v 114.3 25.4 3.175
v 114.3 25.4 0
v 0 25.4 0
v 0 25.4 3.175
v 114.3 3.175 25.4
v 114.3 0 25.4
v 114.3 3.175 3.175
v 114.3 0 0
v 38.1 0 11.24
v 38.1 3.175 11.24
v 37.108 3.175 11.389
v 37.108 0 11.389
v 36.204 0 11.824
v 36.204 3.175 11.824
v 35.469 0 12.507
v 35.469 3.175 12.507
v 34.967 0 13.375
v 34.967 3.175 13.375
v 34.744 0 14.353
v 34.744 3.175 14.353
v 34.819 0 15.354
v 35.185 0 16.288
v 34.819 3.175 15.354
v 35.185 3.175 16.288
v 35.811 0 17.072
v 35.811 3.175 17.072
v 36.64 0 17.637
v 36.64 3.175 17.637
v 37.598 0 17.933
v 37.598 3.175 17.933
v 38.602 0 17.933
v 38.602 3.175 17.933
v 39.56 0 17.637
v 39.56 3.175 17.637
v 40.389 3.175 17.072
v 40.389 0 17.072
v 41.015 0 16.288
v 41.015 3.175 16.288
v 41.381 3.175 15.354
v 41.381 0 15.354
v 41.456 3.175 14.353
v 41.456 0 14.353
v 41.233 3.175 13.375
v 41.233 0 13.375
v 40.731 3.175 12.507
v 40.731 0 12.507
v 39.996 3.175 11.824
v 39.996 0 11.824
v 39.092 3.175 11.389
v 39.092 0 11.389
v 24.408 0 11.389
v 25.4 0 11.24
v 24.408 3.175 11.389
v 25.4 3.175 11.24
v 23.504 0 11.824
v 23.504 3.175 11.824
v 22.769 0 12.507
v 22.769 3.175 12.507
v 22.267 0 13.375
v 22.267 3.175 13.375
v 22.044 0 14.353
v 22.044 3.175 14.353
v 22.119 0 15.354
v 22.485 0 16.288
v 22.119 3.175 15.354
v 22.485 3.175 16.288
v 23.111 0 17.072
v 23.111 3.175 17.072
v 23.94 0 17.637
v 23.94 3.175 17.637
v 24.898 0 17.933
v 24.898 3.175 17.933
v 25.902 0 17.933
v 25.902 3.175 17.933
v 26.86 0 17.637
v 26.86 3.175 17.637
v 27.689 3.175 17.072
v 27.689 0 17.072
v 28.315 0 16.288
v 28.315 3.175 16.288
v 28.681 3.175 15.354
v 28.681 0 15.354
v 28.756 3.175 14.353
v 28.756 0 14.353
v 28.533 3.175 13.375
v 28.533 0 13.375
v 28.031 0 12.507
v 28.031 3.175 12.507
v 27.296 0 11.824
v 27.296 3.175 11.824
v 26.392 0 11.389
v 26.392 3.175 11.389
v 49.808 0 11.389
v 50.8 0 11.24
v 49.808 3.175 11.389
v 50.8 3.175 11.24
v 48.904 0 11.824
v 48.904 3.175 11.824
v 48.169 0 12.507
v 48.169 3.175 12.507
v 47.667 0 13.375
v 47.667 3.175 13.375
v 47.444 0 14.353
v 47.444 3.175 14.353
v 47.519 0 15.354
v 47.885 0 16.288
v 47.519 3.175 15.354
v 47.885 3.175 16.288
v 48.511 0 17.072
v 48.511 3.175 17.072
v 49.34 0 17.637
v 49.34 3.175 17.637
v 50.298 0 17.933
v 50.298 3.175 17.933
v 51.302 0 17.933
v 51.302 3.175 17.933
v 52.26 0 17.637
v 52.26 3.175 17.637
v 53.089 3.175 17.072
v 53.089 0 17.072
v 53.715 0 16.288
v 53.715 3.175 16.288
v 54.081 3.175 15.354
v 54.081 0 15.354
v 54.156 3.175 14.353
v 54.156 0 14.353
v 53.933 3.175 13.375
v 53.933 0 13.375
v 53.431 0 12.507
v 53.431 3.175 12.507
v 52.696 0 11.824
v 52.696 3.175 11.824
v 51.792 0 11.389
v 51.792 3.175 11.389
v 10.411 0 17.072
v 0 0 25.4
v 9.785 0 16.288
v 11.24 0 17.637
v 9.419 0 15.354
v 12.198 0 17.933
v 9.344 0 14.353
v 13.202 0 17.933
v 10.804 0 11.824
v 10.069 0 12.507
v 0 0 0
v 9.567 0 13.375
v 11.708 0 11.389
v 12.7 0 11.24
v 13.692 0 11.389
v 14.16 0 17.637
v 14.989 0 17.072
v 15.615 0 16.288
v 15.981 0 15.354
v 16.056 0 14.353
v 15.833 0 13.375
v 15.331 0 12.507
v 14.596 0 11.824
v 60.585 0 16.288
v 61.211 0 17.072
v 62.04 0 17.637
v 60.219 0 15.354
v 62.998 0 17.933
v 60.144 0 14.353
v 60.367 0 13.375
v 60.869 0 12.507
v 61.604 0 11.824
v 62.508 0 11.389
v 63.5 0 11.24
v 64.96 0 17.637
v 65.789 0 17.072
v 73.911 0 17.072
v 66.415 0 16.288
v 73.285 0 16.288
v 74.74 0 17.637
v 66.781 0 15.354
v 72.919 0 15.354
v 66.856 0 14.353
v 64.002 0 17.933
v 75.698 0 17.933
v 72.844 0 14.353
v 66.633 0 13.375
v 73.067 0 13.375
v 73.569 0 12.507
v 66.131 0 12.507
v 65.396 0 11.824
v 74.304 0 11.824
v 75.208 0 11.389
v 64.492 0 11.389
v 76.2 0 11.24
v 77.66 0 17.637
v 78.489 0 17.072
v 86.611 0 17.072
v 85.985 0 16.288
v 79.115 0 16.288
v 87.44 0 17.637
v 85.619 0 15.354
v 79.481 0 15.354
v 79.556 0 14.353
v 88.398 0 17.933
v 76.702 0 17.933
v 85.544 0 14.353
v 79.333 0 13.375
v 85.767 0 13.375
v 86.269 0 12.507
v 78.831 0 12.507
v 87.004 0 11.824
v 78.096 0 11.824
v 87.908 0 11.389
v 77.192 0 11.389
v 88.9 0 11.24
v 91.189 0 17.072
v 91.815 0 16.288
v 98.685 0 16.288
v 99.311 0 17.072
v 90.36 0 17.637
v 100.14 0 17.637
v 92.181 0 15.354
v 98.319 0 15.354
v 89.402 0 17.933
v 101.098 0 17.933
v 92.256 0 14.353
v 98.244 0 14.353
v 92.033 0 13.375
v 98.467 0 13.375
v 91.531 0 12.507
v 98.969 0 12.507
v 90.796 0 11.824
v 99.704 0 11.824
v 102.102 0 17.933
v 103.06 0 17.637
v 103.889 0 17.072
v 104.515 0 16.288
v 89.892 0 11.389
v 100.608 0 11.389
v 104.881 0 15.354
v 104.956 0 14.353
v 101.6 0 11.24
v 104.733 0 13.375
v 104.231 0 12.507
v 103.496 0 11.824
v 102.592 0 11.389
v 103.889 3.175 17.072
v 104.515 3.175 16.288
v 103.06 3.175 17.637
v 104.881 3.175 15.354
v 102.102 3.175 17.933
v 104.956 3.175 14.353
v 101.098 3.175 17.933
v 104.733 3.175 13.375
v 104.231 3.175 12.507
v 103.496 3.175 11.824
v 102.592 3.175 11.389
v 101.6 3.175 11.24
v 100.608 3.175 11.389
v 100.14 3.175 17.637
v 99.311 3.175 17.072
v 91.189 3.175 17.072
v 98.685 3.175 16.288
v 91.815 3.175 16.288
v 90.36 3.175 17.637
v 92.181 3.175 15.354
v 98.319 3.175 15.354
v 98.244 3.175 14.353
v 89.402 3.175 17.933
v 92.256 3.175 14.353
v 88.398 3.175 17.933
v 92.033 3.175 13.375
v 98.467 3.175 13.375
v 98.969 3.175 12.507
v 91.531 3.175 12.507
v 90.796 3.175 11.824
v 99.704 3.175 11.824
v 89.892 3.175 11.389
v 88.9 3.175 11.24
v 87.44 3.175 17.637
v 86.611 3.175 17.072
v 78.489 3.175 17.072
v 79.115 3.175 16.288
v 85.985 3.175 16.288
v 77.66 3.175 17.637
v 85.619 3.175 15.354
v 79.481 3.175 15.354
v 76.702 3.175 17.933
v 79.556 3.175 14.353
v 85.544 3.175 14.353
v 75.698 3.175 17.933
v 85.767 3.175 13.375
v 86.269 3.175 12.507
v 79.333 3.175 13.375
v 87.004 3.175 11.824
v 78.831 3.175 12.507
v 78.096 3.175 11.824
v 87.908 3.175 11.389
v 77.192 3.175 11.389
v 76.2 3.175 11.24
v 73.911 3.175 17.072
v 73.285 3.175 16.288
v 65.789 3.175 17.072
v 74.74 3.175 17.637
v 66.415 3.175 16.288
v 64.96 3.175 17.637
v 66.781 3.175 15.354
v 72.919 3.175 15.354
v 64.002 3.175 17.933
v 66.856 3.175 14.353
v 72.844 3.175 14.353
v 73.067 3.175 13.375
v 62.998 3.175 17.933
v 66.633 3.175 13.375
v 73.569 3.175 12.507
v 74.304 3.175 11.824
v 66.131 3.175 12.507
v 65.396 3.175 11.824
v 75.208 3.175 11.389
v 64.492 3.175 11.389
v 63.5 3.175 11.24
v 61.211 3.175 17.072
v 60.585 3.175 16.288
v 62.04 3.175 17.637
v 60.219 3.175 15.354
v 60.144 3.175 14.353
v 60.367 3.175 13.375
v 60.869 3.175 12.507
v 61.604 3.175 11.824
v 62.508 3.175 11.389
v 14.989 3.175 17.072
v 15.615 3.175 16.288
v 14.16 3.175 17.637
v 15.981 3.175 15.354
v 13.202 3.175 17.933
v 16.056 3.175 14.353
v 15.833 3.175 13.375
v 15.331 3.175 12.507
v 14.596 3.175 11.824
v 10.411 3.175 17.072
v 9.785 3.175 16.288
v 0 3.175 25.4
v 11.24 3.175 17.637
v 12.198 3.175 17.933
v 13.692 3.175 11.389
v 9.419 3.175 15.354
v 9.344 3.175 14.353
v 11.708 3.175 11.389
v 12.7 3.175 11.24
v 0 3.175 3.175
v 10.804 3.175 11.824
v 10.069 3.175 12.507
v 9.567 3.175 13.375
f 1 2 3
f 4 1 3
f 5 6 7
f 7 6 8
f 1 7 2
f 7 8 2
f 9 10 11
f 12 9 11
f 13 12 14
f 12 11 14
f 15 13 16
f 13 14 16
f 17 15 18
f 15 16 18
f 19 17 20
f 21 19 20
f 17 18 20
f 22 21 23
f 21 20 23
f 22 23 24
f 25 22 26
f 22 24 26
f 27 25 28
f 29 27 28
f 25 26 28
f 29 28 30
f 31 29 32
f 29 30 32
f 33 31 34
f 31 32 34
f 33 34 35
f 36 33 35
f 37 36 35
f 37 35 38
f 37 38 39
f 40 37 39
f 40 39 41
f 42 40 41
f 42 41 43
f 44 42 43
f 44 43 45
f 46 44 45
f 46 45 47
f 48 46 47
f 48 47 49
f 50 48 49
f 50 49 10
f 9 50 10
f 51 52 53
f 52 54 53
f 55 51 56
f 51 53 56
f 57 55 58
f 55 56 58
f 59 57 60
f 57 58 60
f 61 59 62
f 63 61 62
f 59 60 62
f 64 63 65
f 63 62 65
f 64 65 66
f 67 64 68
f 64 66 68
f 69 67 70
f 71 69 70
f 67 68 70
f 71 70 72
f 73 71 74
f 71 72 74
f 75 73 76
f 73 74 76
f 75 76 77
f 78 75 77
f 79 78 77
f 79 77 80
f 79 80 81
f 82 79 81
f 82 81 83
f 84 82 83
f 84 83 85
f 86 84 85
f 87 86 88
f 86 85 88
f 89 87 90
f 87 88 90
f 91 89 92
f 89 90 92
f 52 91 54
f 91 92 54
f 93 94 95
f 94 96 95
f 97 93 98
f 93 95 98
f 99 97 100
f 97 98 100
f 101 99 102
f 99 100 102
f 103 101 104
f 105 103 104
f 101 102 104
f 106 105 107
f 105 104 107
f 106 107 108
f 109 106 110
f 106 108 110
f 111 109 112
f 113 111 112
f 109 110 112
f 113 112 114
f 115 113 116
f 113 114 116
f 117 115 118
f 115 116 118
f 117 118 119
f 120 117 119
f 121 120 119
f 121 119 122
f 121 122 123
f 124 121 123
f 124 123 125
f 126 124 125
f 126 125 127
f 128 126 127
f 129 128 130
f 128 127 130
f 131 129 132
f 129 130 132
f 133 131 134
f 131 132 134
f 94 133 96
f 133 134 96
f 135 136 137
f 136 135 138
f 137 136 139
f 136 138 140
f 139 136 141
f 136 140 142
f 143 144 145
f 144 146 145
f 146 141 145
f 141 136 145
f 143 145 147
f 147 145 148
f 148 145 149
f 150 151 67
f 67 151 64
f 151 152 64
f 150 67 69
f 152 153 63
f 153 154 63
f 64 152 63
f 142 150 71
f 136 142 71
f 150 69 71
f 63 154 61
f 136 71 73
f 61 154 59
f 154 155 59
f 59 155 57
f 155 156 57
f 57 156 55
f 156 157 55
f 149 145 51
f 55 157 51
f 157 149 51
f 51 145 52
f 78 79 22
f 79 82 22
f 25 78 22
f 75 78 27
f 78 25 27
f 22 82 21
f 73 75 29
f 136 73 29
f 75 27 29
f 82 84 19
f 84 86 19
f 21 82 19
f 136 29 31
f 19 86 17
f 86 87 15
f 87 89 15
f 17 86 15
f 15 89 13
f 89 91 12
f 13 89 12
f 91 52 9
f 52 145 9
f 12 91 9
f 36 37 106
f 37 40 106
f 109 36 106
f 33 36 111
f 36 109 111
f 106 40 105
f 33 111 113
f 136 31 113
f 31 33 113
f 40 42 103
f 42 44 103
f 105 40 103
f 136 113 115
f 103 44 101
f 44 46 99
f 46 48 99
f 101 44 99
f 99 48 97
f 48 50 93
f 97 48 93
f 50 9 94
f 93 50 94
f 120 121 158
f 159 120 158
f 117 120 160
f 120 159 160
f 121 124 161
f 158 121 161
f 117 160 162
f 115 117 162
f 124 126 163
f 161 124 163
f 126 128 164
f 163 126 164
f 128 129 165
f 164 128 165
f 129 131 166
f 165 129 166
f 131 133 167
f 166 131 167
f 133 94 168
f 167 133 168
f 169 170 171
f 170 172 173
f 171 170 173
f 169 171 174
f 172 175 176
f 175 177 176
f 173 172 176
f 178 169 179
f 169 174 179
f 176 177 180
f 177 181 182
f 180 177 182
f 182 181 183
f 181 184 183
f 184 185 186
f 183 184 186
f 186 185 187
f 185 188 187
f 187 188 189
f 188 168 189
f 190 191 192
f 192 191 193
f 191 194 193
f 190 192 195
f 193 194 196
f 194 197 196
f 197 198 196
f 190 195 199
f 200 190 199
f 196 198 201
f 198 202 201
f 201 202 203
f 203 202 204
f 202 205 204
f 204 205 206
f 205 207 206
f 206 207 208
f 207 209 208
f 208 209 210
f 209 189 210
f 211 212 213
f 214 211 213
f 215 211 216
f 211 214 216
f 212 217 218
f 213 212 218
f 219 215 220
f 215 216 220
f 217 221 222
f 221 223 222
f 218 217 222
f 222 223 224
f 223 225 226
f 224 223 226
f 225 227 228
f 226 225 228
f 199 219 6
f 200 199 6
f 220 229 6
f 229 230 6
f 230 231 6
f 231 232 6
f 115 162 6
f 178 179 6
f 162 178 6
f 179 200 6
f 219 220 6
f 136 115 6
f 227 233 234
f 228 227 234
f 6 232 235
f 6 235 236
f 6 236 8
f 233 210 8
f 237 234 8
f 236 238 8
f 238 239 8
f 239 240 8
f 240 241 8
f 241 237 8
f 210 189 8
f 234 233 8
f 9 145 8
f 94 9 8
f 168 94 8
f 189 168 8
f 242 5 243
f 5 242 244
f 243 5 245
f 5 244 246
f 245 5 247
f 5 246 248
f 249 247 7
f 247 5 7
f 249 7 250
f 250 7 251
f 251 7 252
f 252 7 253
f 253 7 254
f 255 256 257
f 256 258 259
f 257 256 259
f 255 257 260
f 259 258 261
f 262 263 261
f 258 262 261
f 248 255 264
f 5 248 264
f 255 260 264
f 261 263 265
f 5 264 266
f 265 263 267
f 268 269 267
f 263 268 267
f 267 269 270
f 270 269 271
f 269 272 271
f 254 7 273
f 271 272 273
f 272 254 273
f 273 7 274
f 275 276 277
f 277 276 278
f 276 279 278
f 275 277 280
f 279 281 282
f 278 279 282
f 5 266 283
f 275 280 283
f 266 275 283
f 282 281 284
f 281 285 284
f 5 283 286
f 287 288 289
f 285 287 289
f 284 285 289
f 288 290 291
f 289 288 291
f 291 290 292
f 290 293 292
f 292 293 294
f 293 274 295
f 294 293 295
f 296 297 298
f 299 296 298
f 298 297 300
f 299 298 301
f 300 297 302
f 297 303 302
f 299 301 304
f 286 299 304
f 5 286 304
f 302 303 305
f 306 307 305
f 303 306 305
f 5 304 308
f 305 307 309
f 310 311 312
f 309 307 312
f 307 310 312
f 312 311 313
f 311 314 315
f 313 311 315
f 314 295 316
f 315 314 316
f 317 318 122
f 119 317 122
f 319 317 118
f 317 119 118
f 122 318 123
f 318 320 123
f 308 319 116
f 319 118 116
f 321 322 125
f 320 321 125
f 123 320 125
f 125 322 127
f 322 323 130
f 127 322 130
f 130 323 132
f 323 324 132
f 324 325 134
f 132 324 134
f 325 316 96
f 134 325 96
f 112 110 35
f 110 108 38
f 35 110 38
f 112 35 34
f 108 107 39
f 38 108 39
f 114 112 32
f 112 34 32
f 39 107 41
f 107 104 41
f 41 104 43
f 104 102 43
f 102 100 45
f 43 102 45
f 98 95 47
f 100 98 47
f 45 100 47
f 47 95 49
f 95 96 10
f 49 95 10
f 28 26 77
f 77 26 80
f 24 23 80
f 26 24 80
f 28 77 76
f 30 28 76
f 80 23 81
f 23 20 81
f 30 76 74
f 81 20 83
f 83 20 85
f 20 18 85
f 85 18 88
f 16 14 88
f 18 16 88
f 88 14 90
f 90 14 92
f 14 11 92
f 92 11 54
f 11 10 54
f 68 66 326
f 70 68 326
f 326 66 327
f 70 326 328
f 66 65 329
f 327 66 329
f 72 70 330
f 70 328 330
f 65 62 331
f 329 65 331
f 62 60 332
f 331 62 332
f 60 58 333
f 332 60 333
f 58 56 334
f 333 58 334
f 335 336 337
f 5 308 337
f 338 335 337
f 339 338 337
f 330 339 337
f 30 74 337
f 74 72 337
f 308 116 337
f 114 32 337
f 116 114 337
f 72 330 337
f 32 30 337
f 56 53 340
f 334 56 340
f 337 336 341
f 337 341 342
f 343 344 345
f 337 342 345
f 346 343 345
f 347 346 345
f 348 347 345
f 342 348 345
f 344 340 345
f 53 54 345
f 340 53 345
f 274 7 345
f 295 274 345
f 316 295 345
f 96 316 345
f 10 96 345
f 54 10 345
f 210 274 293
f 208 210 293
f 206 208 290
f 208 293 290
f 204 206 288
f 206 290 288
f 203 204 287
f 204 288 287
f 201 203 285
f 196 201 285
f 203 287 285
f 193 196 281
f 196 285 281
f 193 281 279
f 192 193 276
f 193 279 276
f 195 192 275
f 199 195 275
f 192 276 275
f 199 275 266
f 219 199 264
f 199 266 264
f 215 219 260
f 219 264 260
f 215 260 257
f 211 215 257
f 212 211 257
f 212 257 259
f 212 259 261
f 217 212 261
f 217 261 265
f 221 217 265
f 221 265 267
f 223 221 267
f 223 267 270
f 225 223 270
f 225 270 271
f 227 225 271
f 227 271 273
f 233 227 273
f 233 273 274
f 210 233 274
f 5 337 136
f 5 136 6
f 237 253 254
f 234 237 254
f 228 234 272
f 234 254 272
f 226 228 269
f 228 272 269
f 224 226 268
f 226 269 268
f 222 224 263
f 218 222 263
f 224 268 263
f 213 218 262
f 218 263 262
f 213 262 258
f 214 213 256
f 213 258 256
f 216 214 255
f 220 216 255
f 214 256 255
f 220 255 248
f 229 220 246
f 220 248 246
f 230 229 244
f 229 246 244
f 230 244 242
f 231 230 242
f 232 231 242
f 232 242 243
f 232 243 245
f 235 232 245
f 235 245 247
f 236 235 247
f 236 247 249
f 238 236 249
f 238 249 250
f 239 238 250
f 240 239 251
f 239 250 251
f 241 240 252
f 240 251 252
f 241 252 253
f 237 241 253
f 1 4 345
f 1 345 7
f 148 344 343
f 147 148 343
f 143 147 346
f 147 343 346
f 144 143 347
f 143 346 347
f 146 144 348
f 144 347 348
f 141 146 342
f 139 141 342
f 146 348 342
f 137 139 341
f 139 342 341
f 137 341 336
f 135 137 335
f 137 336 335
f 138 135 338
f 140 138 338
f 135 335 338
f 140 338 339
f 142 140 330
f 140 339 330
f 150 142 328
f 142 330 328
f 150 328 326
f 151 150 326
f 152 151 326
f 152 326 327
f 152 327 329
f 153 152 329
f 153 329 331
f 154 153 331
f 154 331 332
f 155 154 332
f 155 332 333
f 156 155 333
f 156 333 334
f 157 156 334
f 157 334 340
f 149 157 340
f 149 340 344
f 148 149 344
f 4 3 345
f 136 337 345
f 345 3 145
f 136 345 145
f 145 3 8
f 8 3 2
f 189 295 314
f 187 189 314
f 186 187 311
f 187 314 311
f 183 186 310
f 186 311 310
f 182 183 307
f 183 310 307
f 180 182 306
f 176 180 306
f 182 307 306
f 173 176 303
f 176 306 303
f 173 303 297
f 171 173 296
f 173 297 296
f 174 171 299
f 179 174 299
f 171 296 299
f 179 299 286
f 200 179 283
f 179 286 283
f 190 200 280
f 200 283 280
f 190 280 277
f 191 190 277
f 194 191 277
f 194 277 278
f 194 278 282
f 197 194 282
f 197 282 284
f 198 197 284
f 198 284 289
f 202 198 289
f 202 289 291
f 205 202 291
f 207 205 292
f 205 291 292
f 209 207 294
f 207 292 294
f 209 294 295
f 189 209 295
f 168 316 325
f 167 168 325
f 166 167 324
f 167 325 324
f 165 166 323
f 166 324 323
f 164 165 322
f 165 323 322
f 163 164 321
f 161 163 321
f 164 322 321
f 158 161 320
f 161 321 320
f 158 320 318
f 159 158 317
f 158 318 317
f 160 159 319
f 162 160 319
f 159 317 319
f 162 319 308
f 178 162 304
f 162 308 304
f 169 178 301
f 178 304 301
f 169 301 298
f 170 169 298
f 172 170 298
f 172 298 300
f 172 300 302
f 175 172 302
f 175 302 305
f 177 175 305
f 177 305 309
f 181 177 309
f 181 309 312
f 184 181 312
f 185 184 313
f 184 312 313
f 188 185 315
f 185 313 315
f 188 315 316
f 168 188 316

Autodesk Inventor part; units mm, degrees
ref_plane "YZ Plane" through (0, 0, 0) normal (1, 0, 0) x (0, 1, 0)
ref_plane "XZ Plane" through (0, 0, 0) normal (0, 1, 0) x (-1, 0, 0)
ref_plane "XY Plane" through (0, 0, 0) normal (0, 0, 1) x (1, 0, 0)
sketch "Sketch1" plane through (0, 0, 0) normal (0, 0, 1) x (1, 0, 0)
  line L0 (0, 0) -> (114.3, 0)
  line L1 (114.3, 0) -> (114.3, 25.4)
  line L2 (114.3, 25.4) -> (0, 25.4)
  line L3 (0, 25.4) -> (0, 0)
  dimension "d0" = 114.3
  dimension "d1" = 25.4
extrude "Extrusion1" add sketch "Sketch1" along normal blind 3.175
sketch "Sketch2" plane through (0, 0, 3.175) normal (0, 0, 1) x (1, 0, 0)
  line L0 (0, 0) -> (114.3, 0) projected
  line L1 (0, 0) -> (114.3, 0)
  line L2 (114.3, 0) -> (114.3, 3.175)
  line L3 (114.3, 0) -> (114.3, 25.4) projected
  line L4 (114.3, 3.175) -> (0, 3.175)
  line L5 (0, 3.175) -> (0, 0)
  dimension "d4" = 3.175
extrude "Extrusion2" add sketch "Sketch2" along normal blind 22.225
sketch "Sketch3" plane through (0, 0, 0) normal (0, -1, 0) x (1, 0, 0)
  line L0 (0, 0) -> (0, 25.4) projected
  line L1 (114.3, 0) -> (114.3, 25.4) projected
  line L2 (0, 0) -> (114.3, 0) projected
  point P0 (12.7, 14.605)
  point P1 (38.1, 14.605)
  point P2 (50.8, 14.605)
  point P3 (63.5, 14.605)
  point P4 (76.2, 14.605)
  point P5 (88.9, 14.605)
  point P6 (101.6, 14.605)
  point P7 (25.4, 14.605)
  dimension "d7" = 12.7
  dimension "d9" = 12.7
  dimension "d10" = 12.7
  dimension "d11" = 12.7
  dimension "d12" = 12.7
  dimension "d13" = 12.7
  dimension "d14" = 12.7
  dimension "d15" = 14.605
  dimension "d16" = 14.605
  dimension "d17" = 14.605
  dimension "d18" = 14.605
  dimension "d19" = 14.605
  dimension "d20" = 14.605
  dimension "d21" = 14.605
  dimension "d29" = 12.7
  dimension "d30" = 14.605
hole "Hole1" at (12.7, 0, 14.605) at (38.1, 0, 14.605) at (50.8, 0, 14.605) at (63.5, 0, 14.605) at (76.2, 0, 14.605) at (88.9, 0, 14.605) at (101.6, 0, 14.605) at (25.4, 0, 14.605) direction (0, 1, 0) diameter 6.731 depth 25.4 tip angle 118
properties part number "4 L aluminum piece for transmission bracket"
